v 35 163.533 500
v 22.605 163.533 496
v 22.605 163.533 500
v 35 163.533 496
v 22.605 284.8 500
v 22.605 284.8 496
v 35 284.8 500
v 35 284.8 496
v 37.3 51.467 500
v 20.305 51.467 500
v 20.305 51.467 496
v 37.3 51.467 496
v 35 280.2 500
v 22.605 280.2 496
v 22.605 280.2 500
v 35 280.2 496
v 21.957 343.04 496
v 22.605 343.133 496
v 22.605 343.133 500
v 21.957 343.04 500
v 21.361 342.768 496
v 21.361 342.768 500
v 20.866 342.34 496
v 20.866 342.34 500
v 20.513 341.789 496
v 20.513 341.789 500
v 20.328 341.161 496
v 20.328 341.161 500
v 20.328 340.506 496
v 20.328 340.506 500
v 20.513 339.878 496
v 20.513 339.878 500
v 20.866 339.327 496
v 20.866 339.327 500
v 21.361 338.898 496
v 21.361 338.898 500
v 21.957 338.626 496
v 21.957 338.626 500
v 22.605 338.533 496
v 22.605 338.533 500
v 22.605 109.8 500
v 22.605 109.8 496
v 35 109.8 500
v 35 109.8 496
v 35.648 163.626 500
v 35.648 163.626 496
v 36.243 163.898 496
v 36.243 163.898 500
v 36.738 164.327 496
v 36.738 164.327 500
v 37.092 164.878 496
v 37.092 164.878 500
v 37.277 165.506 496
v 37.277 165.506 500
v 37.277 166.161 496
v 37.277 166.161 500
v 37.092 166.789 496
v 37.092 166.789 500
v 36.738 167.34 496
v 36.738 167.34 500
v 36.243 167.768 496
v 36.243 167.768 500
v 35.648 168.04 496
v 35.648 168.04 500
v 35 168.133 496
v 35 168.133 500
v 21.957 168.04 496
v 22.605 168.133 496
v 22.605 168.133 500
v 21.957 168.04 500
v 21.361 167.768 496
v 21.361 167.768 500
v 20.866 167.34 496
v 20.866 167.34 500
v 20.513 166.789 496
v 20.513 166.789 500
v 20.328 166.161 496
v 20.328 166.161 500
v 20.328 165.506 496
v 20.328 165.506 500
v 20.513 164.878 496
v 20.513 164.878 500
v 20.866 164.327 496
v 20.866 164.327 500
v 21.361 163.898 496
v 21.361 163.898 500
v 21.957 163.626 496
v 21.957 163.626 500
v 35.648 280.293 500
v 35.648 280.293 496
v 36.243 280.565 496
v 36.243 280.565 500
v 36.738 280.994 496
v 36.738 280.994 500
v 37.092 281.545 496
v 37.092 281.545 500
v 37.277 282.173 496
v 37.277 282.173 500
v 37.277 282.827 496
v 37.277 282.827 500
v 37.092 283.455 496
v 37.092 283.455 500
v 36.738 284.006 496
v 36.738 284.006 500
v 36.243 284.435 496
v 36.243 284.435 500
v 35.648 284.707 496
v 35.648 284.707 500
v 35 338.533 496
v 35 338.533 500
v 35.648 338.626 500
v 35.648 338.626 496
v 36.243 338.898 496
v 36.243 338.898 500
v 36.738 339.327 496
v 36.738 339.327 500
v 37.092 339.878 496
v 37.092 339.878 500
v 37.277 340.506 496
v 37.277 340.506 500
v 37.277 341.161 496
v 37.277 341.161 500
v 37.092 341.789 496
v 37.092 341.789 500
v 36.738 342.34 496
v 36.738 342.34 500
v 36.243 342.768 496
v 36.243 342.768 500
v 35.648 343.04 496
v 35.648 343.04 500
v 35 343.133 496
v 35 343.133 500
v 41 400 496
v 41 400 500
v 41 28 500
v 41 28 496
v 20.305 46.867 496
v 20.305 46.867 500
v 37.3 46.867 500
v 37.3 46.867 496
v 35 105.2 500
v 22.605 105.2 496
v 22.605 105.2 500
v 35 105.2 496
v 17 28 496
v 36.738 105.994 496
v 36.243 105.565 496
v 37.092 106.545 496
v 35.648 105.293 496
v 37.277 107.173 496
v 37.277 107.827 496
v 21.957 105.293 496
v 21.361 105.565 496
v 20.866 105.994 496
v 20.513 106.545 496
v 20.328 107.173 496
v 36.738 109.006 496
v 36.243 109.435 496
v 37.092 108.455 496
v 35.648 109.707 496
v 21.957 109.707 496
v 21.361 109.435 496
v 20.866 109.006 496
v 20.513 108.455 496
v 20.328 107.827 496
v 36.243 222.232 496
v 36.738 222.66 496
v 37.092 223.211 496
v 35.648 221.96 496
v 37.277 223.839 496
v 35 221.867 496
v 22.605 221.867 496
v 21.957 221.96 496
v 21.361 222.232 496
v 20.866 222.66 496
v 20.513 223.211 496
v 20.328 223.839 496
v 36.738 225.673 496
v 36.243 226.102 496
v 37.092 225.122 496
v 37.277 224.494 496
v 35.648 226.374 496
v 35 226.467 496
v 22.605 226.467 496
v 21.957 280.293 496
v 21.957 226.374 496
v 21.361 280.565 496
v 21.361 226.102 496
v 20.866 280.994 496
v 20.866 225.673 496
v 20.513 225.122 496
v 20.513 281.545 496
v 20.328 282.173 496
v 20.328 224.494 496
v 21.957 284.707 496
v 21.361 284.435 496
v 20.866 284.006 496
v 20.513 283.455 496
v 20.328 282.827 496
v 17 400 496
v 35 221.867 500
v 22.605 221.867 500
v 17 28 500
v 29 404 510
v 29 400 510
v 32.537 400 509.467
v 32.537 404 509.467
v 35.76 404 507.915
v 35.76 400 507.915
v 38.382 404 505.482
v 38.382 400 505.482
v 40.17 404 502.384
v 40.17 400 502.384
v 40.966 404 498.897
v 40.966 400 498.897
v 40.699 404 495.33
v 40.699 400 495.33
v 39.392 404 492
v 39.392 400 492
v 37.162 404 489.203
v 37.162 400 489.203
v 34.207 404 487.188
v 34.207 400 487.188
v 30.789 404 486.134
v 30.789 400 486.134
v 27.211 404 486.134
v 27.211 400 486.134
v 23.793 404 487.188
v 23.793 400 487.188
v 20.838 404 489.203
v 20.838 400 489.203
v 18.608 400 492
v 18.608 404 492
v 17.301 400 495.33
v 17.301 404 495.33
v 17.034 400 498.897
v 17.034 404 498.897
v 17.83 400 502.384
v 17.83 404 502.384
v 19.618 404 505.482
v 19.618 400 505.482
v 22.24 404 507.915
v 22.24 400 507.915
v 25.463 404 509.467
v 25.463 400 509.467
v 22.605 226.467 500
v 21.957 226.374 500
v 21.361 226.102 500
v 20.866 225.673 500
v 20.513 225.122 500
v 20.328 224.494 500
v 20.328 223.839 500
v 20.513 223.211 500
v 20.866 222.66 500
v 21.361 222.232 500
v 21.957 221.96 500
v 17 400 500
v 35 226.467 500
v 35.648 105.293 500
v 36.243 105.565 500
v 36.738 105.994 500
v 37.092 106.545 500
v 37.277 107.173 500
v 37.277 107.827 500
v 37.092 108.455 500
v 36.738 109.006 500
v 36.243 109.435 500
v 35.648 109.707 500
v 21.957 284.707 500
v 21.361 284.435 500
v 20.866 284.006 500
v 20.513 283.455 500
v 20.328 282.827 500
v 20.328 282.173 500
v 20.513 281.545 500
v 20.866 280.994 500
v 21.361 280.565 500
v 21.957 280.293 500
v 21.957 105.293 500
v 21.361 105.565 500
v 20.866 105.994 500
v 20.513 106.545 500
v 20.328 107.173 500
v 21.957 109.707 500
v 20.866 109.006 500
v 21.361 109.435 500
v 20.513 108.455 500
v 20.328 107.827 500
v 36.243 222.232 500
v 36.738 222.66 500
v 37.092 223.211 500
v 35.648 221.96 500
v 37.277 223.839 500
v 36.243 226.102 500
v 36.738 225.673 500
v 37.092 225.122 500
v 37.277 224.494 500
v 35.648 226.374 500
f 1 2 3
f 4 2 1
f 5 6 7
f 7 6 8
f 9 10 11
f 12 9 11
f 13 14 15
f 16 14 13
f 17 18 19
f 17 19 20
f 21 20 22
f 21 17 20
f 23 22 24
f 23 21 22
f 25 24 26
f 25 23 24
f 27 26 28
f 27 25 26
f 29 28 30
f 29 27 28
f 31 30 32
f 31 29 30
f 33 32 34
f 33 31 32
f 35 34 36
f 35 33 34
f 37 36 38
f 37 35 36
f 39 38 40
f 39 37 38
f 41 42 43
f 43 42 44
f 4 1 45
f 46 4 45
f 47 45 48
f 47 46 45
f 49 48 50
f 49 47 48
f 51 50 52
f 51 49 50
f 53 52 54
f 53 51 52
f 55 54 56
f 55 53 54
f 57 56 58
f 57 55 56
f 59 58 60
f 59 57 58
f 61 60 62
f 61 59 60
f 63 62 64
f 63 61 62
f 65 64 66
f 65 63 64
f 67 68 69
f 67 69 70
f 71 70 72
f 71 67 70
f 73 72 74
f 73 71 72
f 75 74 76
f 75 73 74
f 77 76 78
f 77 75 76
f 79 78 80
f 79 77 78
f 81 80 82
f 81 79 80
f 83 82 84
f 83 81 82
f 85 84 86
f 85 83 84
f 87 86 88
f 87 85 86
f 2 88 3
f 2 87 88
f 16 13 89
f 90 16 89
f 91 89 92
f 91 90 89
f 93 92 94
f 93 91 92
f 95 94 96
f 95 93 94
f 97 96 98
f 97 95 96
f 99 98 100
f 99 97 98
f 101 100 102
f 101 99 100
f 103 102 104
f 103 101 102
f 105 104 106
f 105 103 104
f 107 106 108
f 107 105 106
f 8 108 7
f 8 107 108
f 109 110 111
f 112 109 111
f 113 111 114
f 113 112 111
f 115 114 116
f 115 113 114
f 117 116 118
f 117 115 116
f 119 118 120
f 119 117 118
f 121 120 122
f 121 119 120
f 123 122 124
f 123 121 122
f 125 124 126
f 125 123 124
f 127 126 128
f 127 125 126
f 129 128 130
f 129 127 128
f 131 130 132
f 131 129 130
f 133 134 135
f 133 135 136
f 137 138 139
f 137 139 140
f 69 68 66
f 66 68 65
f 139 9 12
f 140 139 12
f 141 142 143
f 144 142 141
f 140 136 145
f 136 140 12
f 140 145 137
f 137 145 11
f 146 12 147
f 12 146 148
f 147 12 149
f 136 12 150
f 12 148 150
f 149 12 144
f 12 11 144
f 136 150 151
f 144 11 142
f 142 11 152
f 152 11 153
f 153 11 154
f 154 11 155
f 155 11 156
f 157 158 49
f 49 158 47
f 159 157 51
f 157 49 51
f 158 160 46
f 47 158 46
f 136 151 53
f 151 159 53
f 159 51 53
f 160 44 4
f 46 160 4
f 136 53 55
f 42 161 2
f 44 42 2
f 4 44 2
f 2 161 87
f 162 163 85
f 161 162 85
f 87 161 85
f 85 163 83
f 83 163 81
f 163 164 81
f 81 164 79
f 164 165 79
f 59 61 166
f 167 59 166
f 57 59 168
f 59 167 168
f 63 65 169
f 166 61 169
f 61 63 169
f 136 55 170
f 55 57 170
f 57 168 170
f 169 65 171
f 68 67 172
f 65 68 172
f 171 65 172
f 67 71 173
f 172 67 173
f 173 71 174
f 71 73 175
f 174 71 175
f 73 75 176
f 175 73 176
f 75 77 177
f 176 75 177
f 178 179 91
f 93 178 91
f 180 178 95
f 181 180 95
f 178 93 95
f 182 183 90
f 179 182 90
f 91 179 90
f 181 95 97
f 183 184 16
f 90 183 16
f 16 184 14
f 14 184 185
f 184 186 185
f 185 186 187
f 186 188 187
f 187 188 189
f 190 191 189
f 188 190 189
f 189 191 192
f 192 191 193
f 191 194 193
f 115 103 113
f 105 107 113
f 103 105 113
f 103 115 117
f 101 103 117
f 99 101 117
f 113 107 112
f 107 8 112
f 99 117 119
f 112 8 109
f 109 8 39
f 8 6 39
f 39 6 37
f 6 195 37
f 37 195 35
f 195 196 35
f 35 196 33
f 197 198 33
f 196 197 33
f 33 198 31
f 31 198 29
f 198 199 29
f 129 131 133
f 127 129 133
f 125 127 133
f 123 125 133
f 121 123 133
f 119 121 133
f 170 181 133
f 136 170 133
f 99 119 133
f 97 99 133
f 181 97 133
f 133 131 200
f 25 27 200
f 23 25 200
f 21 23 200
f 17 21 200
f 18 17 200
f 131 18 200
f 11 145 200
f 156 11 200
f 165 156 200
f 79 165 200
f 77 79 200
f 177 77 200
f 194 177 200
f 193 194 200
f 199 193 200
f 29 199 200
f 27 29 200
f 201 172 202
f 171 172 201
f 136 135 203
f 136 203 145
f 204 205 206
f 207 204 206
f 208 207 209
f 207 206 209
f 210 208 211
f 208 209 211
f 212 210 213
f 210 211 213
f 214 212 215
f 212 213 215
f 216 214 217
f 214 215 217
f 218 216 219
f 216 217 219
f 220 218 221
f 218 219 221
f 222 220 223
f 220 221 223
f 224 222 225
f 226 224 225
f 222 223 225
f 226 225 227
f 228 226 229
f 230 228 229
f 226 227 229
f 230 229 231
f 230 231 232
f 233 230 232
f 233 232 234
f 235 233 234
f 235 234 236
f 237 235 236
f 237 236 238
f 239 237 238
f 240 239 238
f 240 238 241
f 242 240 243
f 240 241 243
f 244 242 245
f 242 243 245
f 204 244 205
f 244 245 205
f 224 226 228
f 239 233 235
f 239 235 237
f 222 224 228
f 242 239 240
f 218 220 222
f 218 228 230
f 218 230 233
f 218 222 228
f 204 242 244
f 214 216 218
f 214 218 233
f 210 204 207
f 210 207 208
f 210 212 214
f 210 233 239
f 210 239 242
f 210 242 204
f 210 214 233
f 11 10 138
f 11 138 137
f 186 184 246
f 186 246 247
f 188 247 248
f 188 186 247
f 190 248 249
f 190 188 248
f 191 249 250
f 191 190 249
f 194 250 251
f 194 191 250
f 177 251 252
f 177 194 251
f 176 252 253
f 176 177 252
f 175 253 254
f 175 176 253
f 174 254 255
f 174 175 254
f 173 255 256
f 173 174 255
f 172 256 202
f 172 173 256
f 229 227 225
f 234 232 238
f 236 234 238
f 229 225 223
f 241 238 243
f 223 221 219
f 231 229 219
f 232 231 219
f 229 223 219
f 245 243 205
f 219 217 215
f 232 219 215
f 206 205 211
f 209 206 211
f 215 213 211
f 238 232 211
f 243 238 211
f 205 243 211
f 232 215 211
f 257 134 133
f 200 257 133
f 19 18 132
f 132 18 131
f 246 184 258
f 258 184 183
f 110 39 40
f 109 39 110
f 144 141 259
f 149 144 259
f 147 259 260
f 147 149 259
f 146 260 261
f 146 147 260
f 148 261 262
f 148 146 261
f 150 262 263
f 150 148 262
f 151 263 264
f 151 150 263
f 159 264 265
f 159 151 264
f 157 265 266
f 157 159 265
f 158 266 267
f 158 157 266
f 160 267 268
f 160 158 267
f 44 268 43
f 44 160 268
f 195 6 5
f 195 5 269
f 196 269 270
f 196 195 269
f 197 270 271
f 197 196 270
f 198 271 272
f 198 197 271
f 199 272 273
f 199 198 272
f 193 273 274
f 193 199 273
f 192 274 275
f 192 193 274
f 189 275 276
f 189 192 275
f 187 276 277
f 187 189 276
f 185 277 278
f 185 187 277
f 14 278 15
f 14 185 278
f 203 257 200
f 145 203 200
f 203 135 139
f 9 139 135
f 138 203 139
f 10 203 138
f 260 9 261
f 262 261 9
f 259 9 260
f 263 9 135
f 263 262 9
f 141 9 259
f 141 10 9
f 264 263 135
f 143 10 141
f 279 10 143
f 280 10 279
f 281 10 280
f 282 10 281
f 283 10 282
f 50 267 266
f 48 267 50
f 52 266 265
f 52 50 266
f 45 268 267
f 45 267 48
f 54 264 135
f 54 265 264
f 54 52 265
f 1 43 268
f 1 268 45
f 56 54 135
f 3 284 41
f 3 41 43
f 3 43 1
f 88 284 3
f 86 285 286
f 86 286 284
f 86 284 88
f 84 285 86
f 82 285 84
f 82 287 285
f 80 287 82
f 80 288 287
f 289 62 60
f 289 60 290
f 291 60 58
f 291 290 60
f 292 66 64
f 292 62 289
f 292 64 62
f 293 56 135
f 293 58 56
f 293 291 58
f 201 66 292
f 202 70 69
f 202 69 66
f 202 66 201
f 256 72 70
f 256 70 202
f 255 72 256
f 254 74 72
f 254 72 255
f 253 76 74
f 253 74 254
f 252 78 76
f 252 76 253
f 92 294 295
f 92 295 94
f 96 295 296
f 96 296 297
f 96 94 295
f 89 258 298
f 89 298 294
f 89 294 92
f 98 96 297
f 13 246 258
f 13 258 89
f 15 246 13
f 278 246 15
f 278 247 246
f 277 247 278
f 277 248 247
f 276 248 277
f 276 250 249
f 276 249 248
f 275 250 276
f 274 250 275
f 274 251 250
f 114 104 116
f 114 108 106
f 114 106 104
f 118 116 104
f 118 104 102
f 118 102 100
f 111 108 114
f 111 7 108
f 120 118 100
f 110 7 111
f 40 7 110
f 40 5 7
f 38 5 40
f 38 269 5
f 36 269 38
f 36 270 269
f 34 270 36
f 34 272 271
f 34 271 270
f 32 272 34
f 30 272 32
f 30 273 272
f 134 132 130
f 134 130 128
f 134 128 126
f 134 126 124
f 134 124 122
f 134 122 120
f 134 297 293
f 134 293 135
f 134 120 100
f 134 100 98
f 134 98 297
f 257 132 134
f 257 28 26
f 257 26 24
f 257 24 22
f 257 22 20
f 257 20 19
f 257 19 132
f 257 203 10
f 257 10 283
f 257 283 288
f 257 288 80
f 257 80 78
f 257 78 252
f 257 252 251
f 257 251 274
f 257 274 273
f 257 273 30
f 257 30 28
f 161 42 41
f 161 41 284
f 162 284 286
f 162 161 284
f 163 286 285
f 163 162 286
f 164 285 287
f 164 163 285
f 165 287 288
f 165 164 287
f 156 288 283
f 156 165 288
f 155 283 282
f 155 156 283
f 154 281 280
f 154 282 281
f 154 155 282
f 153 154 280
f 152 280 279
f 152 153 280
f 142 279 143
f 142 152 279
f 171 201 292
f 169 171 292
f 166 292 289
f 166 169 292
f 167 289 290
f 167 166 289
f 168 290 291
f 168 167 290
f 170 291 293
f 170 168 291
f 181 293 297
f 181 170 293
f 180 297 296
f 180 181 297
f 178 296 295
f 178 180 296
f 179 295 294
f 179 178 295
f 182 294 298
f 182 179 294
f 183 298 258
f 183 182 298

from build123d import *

# Parameters (mm, degrees)
SLOT_0_START            = 20.304722665
SKETCH1_W               = 6
SKETCH1_H               = 4.6
SLOT_0_DEPTH            = 16.995277335
BAR_START               = 17
SKETCH2_W               = 4
SKETCH2_H               = 372
BAR_DEPTH               = 24
SLOT_END_1_START        = 495
SKETCH3_R               = 2.3
SLOT_END_1_DEPTH        = 6
SLOT_END_B_1_START      = 495
SKETCH4_R               = 2.3
SLOT_END_B_1_DEPTH      = 6
CUT_EXTRUDE1_DEPTH      = 642.623721507
CUT_EXTRUDE1_DEPTH_BACK = 642.623721507
SKETCH5_W               = 12.395277335
SKETCH5_H               = 4.6
SLOT_END_2_START        = 495
SKETCH6_R               = 2.3
SLOT_END_2_DEPTH        = 6
SLOT_END_B_2_START      = 495
SKETCH7_R               = 2.3
SLOT_END_B_2_DEPTH      = 6
CUT_EXTRUDE2_DEPTH      = 642.623721507
CUT_EXTRUDE2_DEPTH_BACK = 642.623721507
SKETCH8_W               = 12.395277335
SKETCH8_H               = 4.6
SLOT_END_3_START        = 495
SKETCH9_R               = 2.3
SLOT_END_3_DEPTH        = 6
SLOT_END_B_3_START      = 495
SKETCH10_R              = 2.3
SLOT_END_B_3_DEPTH      = 6
CUT_EXTRUDE3_DEPTH      = 642.623721507
CUT_EXTRUDE3_DEPTH_BACK = 642.623721507
SKETCH11_W              = 12.395277335
SKETCH11_H              = 4.6
SLOT_END_4_START        = 495
SKETCH12_R              = 2.3
SLOT_END_4_DEPTH        = 6
SLOT_END_B_4_START      = 495
SKETCH13_R              = 2.3
SLOT_END_B_4_DEPTH      = 6
CUT_EXTRUDE4_DEPTH      = 642.623721507
CUT_EXTRUDE4_DEPTH_BACK = 642.623721507
SKETCH14_W              = 12.395277335
SKETCH14_H              = 4.6
SLOT_END_5_START        = 495
SKETCH15_R              = 2.3
SLOT_END_5_DEPTH        = 6
SLOT_END_B_5_START      = 495
SKETCH16_R              = 2.3
SLOT_END_B_5_DEPTH      = 6
CUT_EXTRUDE5_DEPTH      = 642.623721507
CUT_EXTRUDE5_DEPTH_BACK = 642.623721507
SKETCH17_W              = 12.395277335
SKETCH17_H              = 4.6
CROSSHEAD_START         = 400
SKETCH18_R              = 12
CROSSHEAD_DEPTH         = 4


with BuildPart() as part:
    # Sketch1 → slot_0 (new body)
    with BuildSketch(Plane(origin=(0, 0, 0), x_dir=(0, 0, -1), z_dir=(1, 0, 0)).offset(SLOT_0_START)):
        with Locations((-498, 49.166666667)):
            Rectangle(SKETCH1_W, SKETCH1_H)
    extrude(amount=SLOT_0_DEPTH)


with BuildPart() as body_2:
    # Sketch2 → bar (new body)
    with BuildSketch(Plane(origin=(0, 0, 0), x_dir=(0, 0, -1), z_dir=(1, 0, 0)).offset(BAR_START)):
        with Locations((-498, 214)):
            Rectangle(SKETCH2_W, SKETCH2_H)
    extrude(amount=BAR_DEPTH)

    # Combine1: cut part
    add(part.part, mode=Mode.SUBTRACT)


with BuildPart() as body_2_2:
    # Sketch3 → slot_end_1 (new body)
    with BuildSketch(Plane.XY.offset(SLOT_END_1_START)):
        with Locations((22.604722665, 107.5)):
            Circle(SKETCH3_R)
    extrude(amount=SLOT_END_1_DEPTH)


with BuildPart() as body_2_1:
    add(body_2.part)

    # Combine2: cut body 2 2
    add(body_2_2.part, mode=Mode.SUBTRACT)


with BuildPart() as body_2_3:
    # Sketch4 → slot_end_b_1 (new body)
    with BuildSketch(Plane.XY.offset(SLOT_END_B_1_START)):
        with Locations((35, 107.5)):
            Circle(SKETCH4_R)
    extrude(amount=SLOT_END_B_1_DEPTH)


with BuildPart() as body_2_4:
    add(body_2_1.part)

    # Combine3: cut body 2 3
    add(body_2_3.part, mode=Mode.SUBTRACT)

    # Sketch5 → Cut-Extrude1 (cut, two sides: drawn at the far end of the back side and taken through both)
    with BuildSketch(Plane.XY.offset(-CUT_EXTRUDE1_DEPTH_BACK)):
        with Locations((28.802361332, 107.5)):
            Rectangle(SKETCH5_W, SKETCH5_H)
    extrude(amount=CUT_EXTRUDE1_DEPTH + CUT_EXTRUDE1_DEPTH_BACK, mode=Mode.SUBTRACT)


with BuildPart() as body_2_4_1:
    # Sketch6 → slot_end_2 (new body)
    with BuildSketch(Plane.XY.offset(SLOT_END_2_START)):
        with Locations((22.604722665, 165.833333333)):
            Circle(SKETCH6_R)
    extrude(amount=SLOT_END_2_DEPTH)


with BuildPart() as body_2_5:
    add(body_2_4.part)

    # Combine4: cut body 2 4
    add(body_2_4_1.part, mode=Mode.SUBTRACT)


with BuildPart() as body_2_5_1:
    # Sketch7 → slot_end_b_2 (new body)
    with BuildSketch(Plane.XY.offset(SLOT_END_B_2_START)):
        with Locations((35, 165.833333333)):
            Circle(SKETCH7_R)
    extrude(amount=SLOT_END_B_2_DEPTH)


with BuildPart() as body_2_6:
    add(body_2_5.part)

    # Combine5: cut body 2 5
    add(body_2_5_1.part, mode=Mode.SUBTRACT)

    # Sketch8 → Cut-Extrude2 (cut, two sides: drawn at the far end of the back side and taken through both)
    with BuildSketch(Plane.XY.offset(-CUT_EXTRUDE2_DEPTH_BACK)):
        with Locations((28.802361332, 165.833333333)):
            Rectangle(SKETCH8_W, SKETCH8_H)
    extrude(amount=CUT_EXTRUDE2_DEPTH + CUT_EXTRUDE2_DEPTH_BACK, mode=Mode.SUBTRACT)


with BuildPart() as body_2_6_1:
    # Sketch9 → slot_end_3 (new body)
    with BuildSketch(Plane.XY.offset(SLOT_END_3_START)):
        with Locations((22.604722665, 224.166666667)):
            Circle(SKETCH9_R)
    extrude(amount=SLOT_END_3_DEPTH)


with BuildPart() as body_2_7:
    add(body_2_6.part)

    # Combine6: cut body 2 6
    add(body_2_6_1.part, mode=Mode.SUBTRACT)


with BuildPart() as body_2_7_1:
    # Sketch10 → slot_end_b_3 (new body)
    with BuildSketch(Plane.XY.offset(SLOT_END_B_3_START)):
        with Locations((35, 224.166666667)):
            Circle(SKETCH10_R)
    extrude(amount=SLOT_END_B_3_DEPTH)


with BuildPart() as body_2_8:
    add(body_2_7.part)

    # Combine7: cut body 2 7
    add(body_2_7_1.part, mode=Mode.SUBTRACT)

    # Sketch11 → Cut-Extrude3 (cut, two sides: drawn at the far end of the back side and taken through both)
    with BuildSketch(Plane.XY.offset(-CUT_EXTRUDE3_DEPTH_BACK)):
        with Locations((28.802361332, 224.166666667)):
            Rectangle(SKETCH11_W, SKETCH11_H)
    extrude(amount=CUT_EXTRUDE3_DEPTH + CUT_EXTRUDE3_DEPTH_BACK, mode=Mode.SUBTRACT)


with BuildPart() as body_2_8_1:
    # Sketch12 → slot_end_4 (new body)
    with BuildSketch(Plane.XY.offset(SLOT_END_4_START)):
        with Locations((22.604722665, 282.5)):
            Circle(SKETCH12_R)
    extrude(amount=SLOT_END_4_DEPTH)


with BuildPart() as body_2_9:
    add(body_2_8.part)

    # Combine8: cut body 2 8
    add(body_2_8_1.part, mode=Mode.SUBTRACT)


with BuildPart() as body_2_9_1:
    # Sketch13 → slot_end_b_4 (new body)
    with BuildSketch(Plane.XY.offset(SLOT_END_B_4_START)):
        with Locations((35, 282.5)):
            Circle(SKETCH13_R)
    extrude(amount=SLOT_END_B_4_DEPTH)


with BuildPart() as body_2_10:
    add(body_2_9.part)

    # Combine9: cut body 2 9
    add(body_2_9_1.part, mode=Mode.SUBTRACT)

    # Sketch14 → Cut-Extrude4 (cut, two sides: drawn at the far end of the back side and taken through both)
    with BuildSketch(Plane.XY.offset(-CUT_EXTRUDE4_DEPTH_BACK)):
        with Locations((28.802361332, 282.5)):
            Rectangle(SKETCH14_W, SKETCH14_H)
    extrude(amount=CUT_EXTRUDE4_DEPTH + CUT_EXTRUDE4_DEPTH_BACK, mode=Mode.SUBTRACT)


with BuildPart() as body_2_10_1:
    # Sketch15 → slot_end_5 (new body)
    with BuildSketch(Plane.XY.offset(SLOT_END_5_START)):
        with Locations((22.604722665, 340.833333333)):
            Circle(SKETCH15_R)
    extrude(amount=SLOT_END_5_DEPTH)


with BuildPart() as body_2_11:
    add(body_2_10.part)

    # Combine10: cut body 2 10
    add(body_2_10_1.part, mode=Mode.SUBTRACT)


with BuildPart() as body_2_11_1:
    # Sketch16 → slot_end_b_5 (new body)
    with BuildSketch(Plane.XY.offset(SLOT_END_B_5_START)):
        with Locations((35, 340.833333333)):
            Circle(SKETCH16_R)
    extrude(amount=SLOT_END_B_5_DEPTH)


with BuildPart() as body_2_12:
    add(body_2_11.part)

    # Combine11: cut body 2 11
    add(body_2_11_1.part, mode=Mode.SUBTRACT)

    # Sketch17 → Cut-Extrude5 (cut, two sides: drawn at the far end of the back side and taken through both)
    with BuildSketch(Plane.XY.offset(-CUT_EXTRUDE5_DEPTH_BACK)):
        with Locations((28.802361332, 340.833333333)):
            Rectangle(SKETCH17_W, SKETCH17_H)
    extrude(amount=CUT_EXTRUDE5_DEPTH + CUT_EXTRUDE5_DEPTH_BACK, mode=Mode.SUBTRACT)


with BuildPart() as body_2_12_1:
    # Sketch18 → crosshead (new body)
    with BuildSketch(Plane(origin=(0, 0, 0), x_dir=(1, 0, 0), z_dir=(0, 1, 0)).offset(CROSSHEAD_START)):
        with Locations((29, -498)):
            Circle(SKETCH18_R)
    extrude(amount=CROSSHEAD_DEPTH)


solid = Compound([body_2_12.part, body_2_12_1.part])
